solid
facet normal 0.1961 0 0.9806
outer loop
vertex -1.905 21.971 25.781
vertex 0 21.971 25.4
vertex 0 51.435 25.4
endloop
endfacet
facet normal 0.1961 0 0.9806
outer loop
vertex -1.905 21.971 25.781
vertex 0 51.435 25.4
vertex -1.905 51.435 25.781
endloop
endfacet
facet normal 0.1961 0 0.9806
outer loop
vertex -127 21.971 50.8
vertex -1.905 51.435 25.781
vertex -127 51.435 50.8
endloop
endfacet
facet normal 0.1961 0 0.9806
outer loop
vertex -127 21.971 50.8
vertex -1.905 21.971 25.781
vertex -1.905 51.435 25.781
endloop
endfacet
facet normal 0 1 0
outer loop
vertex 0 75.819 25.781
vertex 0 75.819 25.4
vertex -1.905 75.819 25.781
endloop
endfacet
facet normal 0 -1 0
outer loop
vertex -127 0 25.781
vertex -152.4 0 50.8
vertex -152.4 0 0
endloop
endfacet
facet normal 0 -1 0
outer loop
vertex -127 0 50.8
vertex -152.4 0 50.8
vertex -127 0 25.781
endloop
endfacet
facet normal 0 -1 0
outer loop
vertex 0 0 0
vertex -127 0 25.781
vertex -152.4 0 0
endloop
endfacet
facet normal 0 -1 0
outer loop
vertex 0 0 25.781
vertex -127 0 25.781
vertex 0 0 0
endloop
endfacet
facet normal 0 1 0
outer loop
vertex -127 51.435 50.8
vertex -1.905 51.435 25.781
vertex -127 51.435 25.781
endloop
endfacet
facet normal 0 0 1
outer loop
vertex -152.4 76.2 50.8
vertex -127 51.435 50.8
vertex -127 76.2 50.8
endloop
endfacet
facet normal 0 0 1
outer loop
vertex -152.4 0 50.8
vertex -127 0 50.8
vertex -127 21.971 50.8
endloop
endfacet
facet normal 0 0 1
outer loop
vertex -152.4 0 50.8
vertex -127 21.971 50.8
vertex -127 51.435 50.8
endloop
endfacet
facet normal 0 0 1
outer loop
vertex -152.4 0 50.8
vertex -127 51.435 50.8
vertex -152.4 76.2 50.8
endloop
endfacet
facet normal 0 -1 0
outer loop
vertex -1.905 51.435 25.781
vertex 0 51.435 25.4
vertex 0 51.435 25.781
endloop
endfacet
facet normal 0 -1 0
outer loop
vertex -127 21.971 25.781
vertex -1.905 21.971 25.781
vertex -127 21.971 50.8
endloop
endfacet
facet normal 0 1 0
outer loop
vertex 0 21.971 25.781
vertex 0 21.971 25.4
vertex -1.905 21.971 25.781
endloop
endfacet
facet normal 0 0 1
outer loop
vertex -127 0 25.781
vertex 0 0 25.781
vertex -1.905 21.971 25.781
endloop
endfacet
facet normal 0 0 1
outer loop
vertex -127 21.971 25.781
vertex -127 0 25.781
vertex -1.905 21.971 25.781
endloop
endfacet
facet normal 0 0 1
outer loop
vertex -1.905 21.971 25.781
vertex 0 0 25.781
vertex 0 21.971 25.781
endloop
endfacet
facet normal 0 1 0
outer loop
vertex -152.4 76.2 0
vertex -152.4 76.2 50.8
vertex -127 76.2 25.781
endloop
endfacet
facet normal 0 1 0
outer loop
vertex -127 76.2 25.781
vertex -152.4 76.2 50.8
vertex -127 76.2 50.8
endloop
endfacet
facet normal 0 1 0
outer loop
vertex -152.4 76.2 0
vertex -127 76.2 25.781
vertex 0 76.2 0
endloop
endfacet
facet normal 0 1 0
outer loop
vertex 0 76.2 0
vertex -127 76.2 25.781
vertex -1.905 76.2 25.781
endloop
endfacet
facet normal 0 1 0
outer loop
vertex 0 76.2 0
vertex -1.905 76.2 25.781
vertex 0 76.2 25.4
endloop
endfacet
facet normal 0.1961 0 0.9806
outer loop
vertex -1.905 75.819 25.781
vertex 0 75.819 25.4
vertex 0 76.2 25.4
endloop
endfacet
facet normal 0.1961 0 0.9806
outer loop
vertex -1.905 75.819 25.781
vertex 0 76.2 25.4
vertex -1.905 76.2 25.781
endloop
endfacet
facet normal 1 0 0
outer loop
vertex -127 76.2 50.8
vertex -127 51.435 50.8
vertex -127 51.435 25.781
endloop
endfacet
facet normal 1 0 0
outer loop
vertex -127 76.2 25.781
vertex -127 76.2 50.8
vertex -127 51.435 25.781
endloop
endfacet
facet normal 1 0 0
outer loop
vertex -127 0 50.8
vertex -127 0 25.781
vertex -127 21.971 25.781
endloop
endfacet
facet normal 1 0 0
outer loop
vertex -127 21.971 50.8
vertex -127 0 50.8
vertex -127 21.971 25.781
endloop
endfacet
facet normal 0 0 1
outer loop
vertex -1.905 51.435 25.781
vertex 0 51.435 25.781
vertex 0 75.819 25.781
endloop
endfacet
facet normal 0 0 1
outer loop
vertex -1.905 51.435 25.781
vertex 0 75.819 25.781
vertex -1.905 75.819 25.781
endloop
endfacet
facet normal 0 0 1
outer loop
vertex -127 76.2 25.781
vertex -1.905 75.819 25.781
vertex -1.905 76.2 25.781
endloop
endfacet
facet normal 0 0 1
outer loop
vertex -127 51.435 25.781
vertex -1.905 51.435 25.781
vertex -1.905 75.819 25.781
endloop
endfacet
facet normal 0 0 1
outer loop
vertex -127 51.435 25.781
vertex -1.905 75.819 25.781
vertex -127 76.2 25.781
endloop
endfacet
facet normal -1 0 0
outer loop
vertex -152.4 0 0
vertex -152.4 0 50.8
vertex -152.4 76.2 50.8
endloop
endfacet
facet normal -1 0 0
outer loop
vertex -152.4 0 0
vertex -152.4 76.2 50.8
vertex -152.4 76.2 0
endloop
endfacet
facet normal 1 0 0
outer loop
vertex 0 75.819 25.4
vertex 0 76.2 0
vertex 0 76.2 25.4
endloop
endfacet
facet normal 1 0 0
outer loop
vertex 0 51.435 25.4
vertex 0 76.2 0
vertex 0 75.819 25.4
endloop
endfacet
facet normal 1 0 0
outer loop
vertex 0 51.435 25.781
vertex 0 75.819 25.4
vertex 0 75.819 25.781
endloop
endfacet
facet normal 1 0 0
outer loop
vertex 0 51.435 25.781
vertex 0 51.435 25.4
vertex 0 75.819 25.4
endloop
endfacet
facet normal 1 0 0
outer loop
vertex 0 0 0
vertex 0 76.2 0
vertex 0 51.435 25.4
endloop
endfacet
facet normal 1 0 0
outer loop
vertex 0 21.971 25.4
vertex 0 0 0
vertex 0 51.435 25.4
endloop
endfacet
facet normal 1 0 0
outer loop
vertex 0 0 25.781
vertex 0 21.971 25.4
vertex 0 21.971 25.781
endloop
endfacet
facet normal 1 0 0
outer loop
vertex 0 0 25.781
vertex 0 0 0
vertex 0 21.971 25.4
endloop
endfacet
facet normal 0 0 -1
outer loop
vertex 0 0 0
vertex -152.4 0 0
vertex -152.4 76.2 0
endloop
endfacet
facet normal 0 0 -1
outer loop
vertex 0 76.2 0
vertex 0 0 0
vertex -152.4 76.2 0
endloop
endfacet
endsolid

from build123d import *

# Parameters (mm, degrees)
F2_DEPTH = 76.2
F1_W     = 21.9710022211
F1_H     = 51.1809997261
F3_DEPTH = 127
F1_W_2   = 24.3839994073
F4_DEPTH = 127
F5_DEPTH = 25.4
F6_DEPTH = 25.4


with BuildPart() as f2:
    # F0 (on Front) → F2 (new body)
    with BuildSketch(Plane.XZ):
        Polygon((-152.4, 0), (0, 0), (0, 25.4), (-127, 25.4), (-127, 50.8), (-152.4, 50.8), align=None)
        Polygon((-127, 25.4), (0, 25.4), (-127, 50.8), align=None)
    extrude(amount=-F2_DEPTH)

    # F1 (on Right) → F3 (join)
    with BuildSketch(Plane.YZ):
        with Locations((10.9855011106, 25.590499863)):
            Rectangle(F1_W, F1_H)
    extrude(amount=-F3_DEPTH)

    # F1 (on Right) → F4 (join)
    with BuildSketch(Plane.YZ):
        with Locations((63.6270008981, 25.590499863)):
            Rectangle(F1_W_2, F1_H)
    extrude(amount=-F4_DEPTH)

    # F5 (cut): faces of the model
    f5_faces = [f2.faces().sort_by_distance(p)[0] for p in [
        (-63.5, 10.9855011106, 51.1809997261),
        (-63.5, 63.6270008981, 51.1809997261),
    ]]
    extrude(f5_faces, amount=-F5_DEPTH, mode=Mode.SUBTRACT)

    # F6 (cut): a face of the model
    f6_faces = [f2.faces().sort_by_distance(p)[0] for p in [
        (-85.3016662101, 75.8190006018, 34.120666484),
    ]]
    extrude(f6_faces, amount=-F6_DEPTH, mode=Mode.SUBTRACT)


solid = f2.part
